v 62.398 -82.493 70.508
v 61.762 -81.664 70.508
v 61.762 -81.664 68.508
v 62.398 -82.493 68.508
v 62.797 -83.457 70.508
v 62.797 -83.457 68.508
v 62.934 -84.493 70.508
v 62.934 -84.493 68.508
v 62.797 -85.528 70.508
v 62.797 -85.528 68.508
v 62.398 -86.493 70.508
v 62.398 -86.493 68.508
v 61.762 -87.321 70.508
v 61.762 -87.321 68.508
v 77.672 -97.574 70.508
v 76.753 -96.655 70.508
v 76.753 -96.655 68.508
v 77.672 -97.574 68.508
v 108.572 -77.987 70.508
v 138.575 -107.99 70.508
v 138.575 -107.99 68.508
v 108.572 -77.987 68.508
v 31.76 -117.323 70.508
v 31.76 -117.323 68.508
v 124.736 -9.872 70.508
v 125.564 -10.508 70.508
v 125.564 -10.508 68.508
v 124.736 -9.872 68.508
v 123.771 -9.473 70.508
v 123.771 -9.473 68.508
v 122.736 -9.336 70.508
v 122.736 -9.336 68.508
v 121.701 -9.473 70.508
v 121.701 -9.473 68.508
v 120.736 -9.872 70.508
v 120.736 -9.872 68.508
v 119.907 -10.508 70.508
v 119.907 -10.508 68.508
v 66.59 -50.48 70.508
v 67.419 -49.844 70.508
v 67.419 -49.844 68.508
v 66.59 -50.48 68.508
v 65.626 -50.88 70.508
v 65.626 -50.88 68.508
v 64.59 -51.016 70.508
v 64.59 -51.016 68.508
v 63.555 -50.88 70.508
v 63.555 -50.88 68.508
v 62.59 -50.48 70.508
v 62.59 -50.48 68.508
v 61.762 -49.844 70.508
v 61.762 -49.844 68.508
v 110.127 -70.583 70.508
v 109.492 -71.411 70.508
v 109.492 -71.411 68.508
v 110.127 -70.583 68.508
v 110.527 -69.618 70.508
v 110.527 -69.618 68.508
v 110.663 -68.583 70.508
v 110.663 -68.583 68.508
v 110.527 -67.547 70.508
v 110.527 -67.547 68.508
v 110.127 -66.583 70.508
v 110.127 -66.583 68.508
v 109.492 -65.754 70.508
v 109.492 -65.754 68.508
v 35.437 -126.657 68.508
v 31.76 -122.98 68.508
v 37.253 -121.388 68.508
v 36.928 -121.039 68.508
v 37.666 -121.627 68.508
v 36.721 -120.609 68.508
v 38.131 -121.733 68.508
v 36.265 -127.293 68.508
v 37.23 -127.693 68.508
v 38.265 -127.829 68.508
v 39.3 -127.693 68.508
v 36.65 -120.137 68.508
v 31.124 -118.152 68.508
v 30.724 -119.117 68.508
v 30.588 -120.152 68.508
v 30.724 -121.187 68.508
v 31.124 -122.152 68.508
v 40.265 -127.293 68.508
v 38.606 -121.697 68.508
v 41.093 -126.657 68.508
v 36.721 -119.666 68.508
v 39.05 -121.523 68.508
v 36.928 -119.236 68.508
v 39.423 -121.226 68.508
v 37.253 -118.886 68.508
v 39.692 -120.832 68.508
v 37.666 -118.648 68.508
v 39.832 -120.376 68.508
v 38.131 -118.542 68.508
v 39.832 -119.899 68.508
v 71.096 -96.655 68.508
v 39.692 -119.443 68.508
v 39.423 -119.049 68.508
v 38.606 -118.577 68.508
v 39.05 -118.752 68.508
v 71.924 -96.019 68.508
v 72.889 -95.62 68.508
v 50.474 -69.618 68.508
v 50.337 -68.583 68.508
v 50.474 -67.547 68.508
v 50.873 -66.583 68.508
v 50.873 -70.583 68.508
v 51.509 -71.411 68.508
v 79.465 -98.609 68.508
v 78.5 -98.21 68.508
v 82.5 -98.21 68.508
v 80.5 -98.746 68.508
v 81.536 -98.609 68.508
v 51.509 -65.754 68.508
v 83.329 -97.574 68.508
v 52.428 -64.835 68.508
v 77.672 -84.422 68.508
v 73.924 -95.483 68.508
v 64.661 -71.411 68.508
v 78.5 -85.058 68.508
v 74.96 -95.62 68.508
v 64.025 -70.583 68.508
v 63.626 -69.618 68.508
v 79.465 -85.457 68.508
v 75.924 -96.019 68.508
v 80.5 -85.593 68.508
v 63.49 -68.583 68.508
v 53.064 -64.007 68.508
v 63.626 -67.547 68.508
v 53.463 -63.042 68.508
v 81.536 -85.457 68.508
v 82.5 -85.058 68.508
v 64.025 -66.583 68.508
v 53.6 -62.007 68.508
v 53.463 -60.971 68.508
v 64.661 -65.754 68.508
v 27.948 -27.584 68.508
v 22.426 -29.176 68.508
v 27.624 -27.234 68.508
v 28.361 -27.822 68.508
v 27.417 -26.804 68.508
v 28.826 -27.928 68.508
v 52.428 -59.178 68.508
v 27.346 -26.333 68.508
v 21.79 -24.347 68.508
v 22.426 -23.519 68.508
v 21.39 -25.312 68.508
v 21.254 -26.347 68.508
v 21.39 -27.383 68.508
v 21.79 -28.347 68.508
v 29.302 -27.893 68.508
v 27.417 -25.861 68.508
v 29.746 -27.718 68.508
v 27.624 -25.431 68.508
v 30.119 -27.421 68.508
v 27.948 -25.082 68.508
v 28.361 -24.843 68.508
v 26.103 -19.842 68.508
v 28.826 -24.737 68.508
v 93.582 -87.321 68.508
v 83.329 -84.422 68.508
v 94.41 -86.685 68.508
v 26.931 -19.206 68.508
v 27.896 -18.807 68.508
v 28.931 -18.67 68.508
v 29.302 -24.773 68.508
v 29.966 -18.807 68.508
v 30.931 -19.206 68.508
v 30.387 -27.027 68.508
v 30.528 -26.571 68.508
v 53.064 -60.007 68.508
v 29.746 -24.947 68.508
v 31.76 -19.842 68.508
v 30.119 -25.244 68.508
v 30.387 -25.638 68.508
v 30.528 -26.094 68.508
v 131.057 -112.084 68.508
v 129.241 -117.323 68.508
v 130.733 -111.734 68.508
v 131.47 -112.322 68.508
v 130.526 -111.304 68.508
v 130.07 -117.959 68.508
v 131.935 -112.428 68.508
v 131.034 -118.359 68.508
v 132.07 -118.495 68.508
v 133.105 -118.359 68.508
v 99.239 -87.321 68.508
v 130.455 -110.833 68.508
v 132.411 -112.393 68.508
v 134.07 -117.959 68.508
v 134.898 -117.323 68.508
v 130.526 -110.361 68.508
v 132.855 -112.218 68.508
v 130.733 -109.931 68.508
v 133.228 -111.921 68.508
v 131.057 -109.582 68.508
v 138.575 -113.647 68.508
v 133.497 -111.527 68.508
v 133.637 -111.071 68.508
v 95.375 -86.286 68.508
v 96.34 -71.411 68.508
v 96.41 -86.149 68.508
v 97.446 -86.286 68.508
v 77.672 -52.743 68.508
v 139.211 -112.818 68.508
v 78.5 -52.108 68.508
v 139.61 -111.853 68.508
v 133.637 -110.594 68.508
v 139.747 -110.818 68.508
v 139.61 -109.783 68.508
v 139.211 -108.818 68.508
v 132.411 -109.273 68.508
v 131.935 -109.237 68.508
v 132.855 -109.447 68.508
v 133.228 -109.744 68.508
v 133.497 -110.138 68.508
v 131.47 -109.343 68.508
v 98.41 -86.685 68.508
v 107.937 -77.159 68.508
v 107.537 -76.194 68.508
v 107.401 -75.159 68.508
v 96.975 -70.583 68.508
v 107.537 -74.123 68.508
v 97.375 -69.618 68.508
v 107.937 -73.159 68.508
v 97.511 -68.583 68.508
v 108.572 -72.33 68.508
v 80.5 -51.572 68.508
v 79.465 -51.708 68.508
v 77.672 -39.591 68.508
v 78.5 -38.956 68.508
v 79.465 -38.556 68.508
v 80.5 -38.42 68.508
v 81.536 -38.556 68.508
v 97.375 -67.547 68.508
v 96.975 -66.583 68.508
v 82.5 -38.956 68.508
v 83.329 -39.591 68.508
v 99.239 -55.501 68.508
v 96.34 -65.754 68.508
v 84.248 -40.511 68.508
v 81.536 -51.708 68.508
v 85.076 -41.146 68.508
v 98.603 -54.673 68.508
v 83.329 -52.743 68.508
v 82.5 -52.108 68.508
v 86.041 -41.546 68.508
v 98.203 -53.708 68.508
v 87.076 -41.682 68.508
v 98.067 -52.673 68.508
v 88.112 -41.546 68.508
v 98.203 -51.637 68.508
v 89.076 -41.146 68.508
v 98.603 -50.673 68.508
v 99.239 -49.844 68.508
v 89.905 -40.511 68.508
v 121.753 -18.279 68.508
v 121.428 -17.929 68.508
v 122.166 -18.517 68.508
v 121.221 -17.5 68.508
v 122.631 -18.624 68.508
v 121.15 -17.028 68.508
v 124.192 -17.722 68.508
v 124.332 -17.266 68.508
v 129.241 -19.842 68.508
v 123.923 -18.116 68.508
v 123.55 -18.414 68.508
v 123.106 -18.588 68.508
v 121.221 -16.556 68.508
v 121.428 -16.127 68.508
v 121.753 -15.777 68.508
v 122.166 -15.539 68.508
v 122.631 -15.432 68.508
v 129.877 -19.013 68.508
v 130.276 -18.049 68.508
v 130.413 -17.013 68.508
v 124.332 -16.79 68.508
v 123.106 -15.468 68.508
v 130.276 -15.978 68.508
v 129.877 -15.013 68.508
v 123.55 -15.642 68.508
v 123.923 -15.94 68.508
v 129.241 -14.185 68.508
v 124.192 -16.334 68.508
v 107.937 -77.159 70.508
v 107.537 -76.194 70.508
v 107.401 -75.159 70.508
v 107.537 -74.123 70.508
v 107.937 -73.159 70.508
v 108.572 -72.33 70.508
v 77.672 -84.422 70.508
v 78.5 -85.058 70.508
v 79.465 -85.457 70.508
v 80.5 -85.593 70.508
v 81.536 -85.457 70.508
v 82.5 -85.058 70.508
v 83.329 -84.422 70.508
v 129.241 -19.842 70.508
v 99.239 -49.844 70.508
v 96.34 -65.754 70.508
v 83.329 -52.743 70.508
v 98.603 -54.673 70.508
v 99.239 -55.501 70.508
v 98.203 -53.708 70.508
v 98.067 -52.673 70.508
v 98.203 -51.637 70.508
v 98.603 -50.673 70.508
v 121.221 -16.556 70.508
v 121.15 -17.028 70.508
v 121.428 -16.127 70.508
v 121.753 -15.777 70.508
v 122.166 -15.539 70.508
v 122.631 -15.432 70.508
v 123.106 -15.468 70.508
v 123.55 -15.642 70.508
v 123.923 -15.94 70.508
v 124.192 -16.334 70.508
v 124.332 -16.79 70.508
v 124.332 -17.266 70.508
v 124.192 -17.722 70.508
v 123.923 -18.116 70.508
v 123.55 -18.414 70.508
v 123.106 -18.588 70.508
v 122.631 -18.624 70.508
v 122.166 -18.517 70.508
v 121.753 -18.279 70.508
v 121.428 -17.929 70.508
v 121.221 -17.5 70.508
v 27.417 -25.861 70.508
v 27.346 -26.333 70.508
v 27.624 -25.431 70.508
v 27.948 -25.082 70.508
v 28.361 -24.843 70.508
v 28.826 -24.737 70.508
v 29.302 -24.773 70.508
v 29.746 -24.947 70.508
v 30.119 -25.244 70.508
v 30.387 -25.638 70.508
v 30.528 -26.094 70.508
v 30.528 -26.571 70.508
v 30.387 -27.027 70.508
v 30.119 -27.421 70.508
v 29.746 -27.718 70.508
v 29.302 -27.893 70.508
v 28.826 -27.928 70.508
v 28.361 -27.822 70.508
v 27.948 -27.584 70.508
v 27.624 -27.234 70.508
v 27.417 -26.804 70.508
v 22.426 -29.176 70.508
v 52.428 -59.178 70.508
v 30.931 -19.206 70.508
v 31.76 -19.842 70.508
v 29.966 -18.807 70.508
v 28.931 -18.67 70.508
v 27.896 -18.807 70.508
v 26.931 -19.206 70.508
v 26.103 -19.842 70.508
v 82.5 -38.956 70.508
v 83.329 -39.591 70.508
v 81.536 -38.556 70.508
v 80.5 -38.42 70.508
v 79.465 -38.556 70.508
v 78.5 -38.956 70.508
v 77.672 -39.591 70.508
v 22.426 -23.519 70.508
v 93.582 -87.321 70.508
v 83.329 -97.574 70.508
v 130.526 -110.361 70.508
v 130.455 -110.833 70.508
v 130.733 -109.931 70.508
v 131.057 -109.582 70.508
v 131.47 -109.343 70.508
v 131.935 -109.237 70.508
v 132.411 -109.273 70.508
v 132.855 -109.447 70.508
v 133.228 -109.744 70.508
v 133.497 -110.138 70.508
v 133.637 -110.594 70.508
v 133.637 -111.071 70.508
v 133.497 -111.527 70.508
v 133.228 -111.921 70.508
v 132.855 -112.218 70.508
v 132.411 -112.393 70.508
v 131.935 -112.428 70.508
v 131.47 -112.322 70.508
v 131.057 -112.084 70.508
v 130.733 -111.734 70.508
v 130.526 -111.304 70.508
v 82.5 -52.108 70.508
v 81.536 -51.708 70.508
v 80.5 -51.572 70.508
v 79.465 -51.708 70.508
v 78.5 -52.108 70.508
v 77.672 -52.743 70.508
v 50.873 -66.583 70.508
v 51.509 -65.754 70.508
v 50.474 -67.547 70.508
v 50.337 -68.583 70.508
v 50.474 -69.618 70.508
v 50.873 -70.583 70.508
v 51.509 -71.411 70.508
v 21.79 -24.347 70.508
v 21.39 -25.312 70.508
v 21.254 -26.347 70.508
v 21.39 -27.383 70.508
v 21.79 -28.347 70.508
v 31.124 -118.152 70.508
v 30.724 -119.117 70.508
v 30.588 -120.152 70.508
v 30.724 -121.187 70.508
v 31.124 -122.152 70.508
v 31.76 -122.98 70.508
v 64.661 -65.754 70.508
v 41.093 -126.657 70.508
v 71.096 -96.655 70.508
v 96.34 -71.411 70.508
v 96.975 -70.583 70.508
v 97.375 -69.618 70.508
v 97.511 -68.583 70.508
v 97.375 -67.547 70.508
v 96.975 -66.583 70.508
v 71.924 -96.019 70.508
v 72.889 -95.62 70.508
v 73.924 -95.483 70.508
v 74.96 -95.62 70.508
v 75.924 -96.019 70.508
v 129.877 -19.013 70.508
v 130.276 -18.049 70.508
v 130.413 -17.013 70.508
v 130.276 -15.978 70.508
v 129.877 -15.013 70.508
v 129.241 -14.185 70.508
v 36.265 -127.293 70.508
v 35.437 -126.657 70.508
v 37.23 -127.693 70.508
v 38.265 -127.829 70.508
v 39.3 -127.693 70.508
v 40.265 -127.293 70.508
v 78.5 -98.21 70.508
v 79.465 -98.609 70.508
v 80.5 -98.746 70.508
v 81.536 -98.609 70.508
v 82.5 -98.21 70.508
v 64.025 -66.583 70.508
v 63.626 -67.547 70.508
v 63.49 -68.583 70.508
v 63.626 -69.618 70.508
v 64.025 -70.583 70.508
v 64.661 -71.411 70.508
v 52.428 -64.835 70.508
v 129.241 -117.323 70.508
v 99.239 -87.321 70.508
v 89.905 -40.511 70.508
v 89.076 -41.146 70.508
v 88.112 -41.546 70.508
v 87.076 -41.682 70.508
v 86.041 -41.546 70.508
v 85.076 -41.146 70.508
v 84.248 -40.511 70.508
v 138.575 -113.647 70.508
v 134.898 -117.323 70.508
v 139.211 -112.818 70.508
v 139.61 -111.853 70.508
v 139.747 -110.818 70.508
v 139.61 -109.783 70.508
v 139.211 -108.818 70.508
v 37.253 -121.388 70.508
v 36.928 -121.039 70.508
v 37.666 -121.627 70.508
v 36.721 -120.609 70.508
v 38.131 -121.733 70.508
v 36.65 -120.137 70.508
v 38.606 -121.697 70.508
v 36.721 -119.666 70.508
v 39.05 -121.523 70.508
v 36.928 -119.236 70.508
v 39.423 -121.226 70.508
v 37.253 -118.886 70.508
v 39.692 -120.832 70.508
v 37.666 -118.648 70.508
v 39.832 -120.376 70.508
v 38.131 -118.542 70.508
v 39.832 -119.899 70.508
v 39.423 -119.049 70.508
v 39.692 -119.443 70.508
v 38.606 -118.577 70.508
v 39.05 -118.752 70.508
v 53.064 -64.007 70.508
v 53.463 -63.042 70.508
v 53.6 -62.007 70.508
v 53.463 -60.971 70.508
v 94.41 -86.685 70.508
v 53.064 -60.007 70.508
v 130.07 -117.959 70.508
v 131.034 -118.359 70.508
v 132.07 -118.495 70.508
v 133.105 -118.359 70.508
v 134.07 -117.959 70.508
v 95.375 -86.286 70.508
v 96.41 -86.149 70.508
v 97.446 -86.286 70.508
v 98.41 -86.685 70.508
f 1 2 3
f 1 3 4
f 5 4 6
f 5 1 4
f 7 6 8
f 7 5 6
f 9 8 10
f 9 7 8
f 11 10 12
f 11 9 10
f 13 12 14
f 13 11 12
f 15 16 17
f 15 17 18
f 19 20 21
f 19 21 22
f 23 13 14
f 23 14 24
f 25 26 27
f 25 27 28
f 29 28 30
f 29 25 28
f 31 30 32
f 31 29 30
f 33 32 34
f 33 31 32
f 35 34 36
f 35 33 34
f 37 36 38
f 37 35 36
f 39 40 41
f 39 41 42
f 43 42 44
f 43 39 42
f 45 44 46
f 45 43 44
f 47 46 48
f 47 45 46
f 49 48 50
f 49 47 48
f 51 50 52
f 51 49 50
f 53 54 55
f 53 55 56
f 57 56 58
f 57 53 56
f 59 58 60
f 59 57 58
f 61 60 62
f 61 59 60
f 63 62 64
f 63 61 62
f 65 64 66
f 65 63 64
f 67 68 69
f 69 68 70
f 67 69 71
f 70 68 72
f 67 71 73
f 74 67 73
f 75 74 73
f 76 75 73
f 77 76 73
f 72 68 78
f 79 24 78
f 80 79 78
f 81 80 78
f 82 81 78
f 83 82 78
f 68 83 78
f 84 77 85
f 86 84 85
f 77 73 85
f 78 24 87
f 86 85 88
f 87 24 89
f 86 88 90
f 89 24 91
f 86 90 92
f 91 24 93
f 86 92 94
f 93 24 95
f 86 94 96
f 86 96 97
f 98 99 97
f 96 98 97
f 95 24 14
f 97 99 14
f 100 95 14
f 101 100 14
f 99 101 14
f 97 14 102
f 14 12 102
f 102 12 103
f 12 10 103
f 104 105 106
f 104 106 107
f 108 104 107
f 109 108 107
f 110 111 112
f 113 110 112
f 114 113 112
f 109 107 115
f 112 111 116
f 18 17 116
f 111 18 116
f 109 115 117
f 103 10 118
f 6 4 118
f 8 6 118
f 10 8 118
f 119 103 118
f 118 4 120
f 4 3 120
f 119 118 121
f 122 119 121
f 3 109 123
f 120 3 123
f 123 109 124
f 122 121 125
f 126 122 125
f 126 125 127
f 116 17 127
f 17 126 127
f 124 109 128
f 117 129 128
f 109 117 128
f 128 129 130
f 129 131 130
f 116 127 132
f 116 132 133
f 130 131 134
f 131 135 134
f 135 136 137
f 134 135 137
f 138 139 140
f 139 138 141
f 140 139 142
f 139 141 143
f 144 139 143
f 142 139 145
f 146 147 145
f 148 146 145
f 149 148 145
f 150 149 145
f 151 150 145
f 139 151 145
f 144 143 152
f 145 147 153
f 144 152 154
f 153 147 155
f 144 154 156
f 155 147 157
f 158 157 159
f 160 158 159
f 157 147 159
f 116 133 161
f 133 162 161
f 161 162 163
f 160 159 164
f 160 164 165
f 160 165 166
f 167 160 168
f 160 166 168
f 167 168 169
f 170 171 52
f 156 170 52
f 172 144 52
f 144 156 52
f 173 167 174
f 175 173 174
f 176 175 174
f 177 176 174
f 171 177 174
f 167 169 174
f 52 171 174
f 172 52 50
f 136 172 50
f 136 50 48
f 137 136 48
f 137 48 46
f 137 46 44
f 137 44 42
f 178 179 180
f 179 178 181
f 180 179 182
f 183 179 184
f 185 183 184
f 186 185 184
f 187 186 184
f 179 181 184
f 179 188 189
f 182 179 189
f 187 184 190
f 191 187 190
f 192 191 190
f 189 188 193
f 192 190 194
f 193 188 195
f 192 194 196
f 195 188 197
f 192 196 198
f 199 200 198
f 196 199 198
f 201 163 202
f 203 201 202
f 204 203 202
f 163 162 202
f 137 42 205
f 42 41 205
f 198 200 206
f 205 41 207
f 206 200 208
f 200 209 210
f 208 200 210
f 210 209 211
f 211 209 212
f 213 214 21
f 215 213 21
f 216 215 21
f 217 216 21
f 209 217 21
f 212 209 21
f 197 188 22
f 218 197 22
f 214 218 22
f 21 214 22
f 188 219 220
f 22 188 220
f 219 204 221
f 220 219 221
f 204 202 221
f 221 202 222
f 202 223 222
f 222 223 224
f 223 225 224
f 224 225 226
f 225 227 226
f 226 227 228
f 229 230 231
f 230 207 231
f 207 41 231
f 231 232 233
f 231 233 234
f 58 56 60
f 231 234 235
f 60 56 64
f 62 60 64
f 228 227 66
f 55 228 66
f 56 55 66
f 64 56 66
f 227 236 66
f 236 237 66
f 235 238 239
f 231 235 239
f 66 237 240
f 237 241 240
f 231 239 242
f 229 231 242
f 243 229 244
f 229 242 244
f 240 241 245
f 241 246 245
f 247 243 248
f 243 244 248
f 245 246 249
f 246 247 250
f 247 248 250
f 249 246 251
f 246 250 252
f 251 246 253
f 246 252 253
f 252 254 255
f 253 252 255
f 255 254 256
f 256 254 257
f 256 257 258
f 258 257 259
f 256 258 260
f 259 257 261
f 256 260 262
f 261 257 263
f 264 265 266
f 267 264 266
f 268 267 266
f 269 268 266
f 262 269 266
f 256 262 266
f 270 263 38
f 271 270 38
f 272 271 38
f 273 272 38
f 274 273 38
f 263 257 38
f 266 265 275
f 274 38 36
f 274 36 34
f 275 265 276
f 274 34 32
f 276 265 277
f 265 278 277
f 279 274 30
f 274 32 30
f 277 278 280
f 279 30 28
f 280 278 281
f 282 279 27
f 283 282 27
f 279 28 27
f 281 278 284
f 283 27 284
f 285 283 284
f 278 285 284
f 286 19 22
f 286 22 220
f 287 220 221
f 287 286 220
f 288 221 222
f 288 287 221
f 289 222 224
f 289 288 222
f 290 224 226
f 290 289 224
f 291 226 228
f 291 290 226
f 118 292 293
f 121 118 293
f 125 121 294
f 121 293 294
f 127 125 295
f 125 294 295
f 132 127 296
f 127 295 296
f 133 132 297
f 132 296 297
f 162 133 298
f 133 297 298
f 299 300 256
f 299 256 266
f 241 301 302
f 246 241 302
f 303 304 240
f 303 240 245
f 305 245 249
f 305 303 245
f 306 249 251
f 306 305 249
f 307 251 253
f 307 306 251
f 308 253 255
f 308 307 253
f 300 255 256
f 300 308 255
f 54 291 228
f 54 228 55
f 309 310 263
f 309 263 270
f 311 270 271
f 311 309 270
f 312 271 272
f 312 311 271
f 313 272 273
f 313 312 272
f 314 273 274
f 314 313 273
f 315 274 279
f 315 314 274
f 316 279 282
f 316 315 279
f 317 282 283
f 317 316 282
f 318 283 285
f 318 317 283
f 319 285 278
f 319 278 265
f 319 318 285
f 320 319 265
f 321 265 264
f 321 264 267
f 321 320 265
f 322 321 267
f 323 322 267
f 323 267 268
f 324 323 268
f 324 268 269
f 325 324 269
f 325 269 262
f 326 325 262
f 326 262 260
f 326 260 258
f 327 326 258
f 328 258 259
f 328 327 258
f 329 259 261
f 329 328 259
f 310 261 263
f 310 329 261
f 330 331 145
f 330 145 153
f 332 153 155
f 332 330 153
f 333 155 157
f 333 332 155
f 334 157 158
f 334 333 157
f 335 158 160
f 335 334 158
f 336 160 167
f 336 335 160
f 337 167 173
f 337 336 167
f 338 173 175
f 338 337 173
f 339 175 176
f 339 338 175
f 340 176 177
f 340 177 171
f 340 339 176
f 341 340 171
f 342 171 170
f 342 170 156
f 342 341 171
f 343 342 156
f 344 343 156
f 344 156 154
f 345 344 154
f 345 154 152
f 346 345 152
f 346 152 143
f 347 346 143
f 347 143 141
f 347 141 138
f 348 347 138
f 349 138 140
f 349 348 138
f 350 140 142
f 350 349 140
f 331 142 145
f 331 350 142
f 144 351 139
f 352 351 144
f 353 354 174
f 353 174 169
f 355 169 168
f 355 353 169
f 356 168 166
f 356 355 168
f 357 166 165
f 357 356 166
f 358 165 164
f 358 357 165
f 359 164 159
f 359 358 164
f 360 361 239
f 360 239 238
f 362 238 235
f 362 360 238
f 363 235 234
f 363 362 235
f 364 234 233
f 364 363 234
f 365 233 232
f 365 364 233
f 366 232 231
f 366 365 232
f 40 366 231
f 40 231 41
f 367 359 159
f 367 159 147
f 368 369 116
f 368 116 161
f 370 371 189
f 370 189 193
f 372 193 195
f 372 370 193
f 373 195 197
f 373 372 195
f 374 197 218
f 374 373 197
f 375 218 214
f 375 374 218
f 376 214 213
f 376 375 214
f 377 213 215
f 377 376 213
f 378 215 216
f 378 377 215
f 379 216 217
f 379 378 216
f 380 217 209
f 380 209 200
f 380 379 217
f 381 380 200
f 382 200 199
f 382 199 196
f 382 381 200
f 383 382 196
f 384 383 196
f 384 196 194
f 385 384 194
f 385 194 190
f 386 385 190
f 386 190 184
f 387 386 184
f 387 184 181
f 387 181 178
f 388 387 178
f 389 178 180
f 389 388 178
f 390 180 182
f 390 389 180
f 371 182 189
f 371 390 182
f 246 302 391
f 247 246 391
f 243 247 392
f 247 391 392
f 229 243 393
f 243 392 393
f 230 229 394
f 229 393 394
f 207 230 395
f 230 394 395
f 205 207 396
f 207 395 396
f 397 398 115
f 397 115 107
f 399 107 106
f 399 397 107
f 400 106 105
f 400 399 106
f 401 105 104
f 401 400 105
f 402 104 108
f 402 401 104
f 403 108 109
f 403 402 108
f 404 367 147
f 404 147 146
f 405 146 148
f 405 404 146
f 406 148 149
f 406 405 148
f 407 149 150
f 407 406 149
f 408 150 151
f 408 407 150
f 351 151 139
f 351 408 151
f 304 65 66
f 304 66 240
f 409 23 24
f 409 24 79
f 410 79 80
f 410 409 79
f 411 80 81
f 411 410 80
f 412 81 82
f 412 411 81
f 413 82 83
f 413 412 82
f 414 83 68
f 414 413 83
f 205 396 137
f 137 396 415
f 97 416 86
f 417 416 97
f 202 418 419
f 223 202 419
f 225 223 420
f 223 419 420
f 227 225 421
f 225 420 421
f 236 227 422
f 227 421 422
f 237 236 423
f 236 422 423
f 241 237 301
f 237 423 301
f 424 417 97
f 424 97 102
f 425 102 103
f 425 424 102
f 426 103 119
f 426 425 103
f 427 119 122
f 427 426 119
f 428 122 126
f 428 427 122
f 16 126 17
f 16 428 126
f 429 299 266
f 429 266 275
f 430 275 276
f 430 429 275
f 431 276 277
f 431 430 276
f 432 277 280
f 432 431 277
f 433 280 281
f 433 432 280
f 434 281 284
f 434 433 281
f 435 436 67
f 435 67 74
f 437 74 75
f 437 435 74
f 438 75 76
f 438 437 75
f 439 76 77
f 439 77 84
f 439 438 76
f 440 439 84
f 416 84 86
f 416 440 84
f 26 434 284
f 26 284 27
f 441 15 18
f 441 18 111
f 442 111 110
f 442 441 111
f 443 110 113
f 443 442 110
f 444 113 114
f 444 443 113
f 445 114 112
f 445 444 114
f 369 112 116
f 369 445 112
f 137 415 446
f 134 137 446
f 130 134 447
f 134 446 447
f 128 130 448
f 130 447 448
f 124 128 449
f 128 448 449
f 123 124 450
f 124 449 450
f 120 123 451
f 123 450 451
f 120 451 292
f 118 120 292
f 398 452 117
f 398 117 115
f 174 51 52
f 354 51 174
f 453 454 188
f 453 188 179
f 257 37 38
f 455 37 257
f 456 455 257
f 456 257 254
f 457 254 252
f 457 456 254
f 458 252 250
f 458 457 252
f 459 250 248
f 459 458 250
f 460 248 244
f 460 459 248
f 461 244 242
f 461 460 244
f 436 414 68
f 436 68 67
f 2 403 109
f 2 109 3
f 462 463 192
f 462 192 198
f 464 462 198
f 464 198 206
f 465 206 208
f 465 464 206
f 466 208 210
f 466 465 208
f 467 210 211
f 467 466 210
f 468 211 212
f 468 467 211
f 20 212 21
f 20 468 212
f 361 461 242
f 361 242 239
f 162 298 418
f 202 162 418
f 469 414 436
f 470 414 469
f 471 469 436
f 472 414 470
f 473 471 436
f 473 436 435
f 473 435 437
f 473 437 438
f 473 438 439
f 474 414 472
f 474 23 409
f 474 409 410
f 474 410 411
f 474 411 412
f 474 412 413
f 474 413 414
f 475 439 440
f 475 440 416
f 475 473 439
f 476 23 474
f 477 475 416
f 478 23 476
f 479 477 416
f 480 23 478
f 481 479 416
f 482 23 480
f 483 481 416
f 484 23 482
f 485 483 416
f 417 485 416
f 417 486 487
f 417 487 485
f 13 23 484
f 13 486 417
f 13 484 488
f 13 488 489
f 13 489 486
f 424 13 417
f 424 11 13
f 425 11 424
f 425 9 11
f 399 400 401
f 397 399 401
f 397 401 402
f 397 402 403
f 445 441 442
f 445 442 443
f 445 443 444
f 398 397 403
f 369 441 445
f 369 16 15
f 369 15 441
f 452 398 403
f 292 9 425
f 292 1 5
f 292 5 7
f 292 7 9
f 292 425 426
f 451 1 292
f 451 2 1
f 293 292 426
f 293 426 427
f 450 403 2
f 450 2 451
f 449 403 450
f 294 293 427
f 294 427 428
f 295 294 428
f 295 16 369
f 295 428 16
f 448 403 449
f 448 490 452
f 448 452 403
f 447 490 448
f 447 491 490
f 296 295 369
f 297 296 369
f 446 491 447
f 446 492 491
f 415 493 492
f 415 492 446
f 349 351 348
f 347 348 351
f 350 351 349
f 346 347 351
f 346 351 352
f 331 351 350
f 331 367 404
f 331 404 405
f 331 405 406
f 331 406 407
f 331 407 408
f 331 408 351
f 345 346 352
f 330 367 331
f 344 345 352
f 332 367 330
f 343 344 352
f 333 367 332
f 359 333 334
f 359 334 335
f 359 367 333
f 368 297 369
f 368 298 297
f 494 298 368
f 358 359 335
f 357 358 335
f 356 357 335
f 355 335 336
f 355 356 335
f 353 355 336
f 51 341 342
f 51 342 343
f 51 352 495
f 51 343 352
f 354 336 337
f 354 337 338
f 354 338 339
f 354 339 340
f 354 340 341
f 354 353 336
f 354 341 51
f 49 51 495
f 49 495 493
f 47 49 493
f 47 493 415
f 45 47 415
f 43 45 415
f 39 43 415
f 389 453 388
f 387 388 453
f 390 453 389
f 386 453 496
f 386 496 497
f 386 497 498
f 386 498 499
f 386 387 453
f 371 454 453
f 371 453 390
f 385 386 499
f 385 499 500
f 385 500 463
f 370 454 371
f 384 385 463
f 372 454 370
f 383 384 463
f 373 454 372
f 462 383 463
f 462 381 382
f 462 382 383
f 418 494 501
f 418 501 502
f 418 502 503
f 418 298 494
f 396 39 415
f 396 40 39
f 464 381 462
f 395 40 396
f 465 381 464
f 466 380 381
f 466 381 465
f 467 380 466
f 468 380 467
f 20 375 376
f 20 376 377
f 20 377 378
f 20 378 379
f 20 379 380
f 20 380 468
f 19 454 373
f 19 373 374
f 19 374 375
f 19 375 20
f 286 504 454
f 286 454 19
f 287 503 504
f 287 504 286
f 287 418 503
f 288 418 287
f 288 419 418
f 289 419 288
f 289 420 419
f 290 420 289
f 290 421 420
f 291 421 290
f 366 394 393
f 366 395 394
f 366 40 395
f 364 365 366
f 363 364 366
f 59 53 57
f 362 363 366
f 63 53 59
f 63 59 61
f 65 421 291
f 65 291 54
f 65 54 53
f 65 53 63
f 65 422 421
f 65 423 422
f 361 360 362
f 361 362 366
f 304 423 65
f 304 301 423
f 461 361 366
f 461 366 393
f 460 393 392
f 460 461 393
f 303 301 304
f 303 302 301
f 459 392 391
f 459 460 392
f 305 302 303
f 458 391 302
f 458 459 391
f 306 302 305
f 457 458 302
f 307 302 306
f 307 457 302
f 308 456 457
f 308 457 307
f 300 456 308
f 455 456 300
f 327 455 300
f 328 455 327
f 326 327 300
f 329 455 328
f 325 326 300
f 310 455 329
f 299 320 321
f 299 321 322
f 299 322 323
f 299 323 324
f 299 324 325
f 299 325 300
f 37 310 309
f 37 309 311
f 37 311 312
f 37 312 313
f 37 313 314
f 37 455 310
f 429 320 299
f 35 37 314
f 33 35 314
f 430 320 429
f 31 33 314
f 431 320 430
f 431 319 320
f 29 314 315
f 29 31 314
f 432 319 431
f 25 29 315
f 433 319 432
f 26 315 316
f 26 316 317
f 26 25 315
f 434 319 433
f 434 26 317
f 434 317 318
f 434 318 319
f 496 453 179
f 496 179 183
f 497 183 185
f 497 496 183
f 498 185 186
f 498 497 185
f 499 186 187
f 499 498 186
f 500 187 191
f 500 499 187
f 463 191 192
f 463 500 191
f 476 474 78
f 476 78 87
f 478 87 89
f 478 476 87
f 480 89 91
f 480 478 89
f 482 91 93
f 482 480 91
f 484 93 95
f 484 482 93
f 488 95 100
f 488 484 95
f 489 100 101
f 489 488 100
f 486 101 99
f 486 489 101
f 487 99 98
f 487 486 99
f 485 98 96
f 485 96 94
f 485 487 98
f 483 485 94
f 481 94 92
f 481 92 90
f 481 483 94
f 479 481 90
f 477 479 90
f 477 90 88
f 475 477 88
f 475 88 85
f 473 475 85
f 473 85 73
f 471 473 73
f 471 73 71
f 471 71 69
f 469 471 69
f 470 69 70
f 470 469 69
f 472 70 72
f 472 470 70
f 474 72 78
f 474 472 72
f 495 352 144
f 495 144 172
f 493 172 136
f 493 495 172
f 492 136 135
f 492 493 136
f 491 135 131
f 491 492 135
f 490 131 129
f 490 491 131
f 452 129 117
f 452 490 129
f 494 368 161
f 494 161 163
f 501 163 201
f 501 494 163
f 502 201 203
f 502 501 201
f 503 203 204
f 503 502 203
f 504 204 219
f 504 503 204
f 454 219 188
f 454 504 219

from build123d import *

# Parameters (mm, degrees)
SKETCH2_R           = 1.6
BOSS_EXTRUDE1_DEPTH = 2


with BuildPart() as part:
    # Sketch2 → Boss-Extrude1 (new body)
    with BuildSketch(Plane(origin=(0, 0, 70.507785861), x_dir=(-1, 0, 0), z_dir=(0, 0, -1))):
        with BuildLine():
            Line((-109.491735006, -65.754238005), (-99.238686679, -55.501189677))
            ThreePointArc((-99.238686679, -55.501189677), (-98.067113804, -52.672762553), (-99.238686679, -49.844335428))
            Line((-99.238686679, -49.844335428), (-129.24116868, -19.841853427))
            ThreePointArc((-129.24116868, -19.841853427), (-130.412741556, -17.013426302), (-129.24116868, -14.184999177))
            Line((-129.24116868, -14.184999177), (-125.564213418, -10.508043915))
            ThreePointArc((-125.564213418, -10.508043915), (-122.735786293, -9.33647104), (-119.907359169, -10.508043915))
            Line((-119.907359169, -10.508043915), (-89.904877167, -40.510525916))
            ThreePointArc((-89.904877167, -40.510525916), (-87.076450042, -41.682098792), (-84.248022918, -40.510525916))
            Line((-84.248022918, -40.510525916), (-83.328784102, -39.591287101))
            ThreePointArc((-83.328784102, -39.591287101), (-80.500356977, -38.419714226), (-77.671929853, -39.591287101))
            Line((-77.671929853, -39.591287101), (-67.418881525, -49.844335428))
            ThreePointArc((-67.418881525, -49.844335428), (-64.590454401, -51.015908303), (-61.762027276, -49.844335428))
            Line((-61.762027276, -49.844335428), (-31.759545275, -19.841853427))
            ThreePointArc((-31.759545275, -19.841853427), (-28.93111815, -18.670280551), (-26.102691025, -19.841853427))
            Line((-26.102691025, -19.841853427), (-22.425735763, -23.518808689))
            ThreePointArc((-22.425735763, -23.518808689), (-21.254162888, -26.347235813), (-22.425735763, -29.175662938))
            Line((-22.425735763, -29.175662938), (-52.428217764, -59.17814494))
            ThreePointArc((-52.428217764, -59.17814494), (-53.59979064, -62.006572064), (-52.428217764, -64.834999189))
            Line((-52.428217764, -64.834999189), (-51.508978949, -65.754238005))
            ThreePointArc((-51.508978949, -65.754238005), (-50.337406074, -68.582665129), (-51.508978949, -71.411092254))
            Line((-51.508978949, -71.411092254), (-61.762027276, -81.664140581))
            ThreePointArc((-61.762027276, -81.664140581), (-62.933600151, -84.492567706), (-61.762027276, -87.320994831))
            Line((-61.762027276, -87.320994831), (-31.759545275, -117.323476832))
            ThreePointArc((-31.759545275, -117.323476832), (-30.587972399, -120.151903957), (-31.759545275, -122.980331082))
            Line((-31.759545275, -122.980331082), (-35.436500537, -126.657286344))
            ThreePointArc((-35.436500537, -126.657286344), (-38.264927661, -127.828859219), (-41.093354786, -126.657286344))
            Line((-41.093354786, -126.657286344), (-71.095836788, -96.654804343))
            ThreePointArc((-71.095836788, -96.654804343), (-73.924263912, -95.483231467), (-76.752691037, -96.654804343))
            Line((-76.752691037, -96.654804343), (-77.671929853, -97.574043158))
            ThreePointArc((-77.671929853, -97.574043158), (-80.500356977, -98.745616033), (-83.328784102, -97.574043158))
            Line((-83.328784102, -97.574043158), (-93.581832429, -87.320994831))
            ThreePointArc((-93.581832429, -87.320994831), (-96.410259554, -86.149421956), (-99.238686679, -87.320994831))
            Line((-99.238686679, -87.320994831), (-129.24116868, -117.323476832))
            ThreePointArc((-129.24116868, -117.323476832), (-132.069595805, -118.495049708), (-134.89802293, -117.323476832))
            Line((-134.89802293, -117.323476832), (-138.574978192, -113.64652157))
            ThreePointArc((-138.574978192, -113.64652157), (-139.746551067, -110.818094445), (-138.574978192, -107.989667321))
            Line((-138.574978192, -107.989667321), (-108.572496191, -77.987185319))
            ThreePointArc((-108.572496191, -77.987185319), (-107.400923315, -75.158758194), (-108.572496191, -72.33033107))
            Line((-108.572496191, -72.33033107), (-109.491735006, -71.411092254))
            ThreePointArc((-109.491735006, -71.411092254), (-110.663307881, -68.582665129), (-109.491735006, -65.754238005))
        make_face()
        with Locations((-132.055025121, -110.832665129)):
            Circle(SKETCH2_R, mode=Mode.SUBTRACT)
        with Locations((-28.945688834, -26.332665129)):
            Circle(SKETCH2_R, mode=Mode.SUBTRACT)
        with Locations((-122.750356977, -17.027996986)):
            Circle(SKETCH2_R, mode=Mode.SUBTRACT)
        with Locations((-38.250356977, -120.137333273)):
            Circle(SKETCH2_R, mode=Mode.SUBTRACT)
        with BuildLine():
            Line((-96.339548876, -65.754238005), (-83.328784102, -52.743473231))
            ThreePointArc((-83.328784102, -52.743473231), (-80.500356977, -51.571900356), (-77.671929853, -52.743473231))
            Line((-77.671929853, -52.743473231), (-64.661165079, -65.754238005))
            ThreePointArc((-64.661165079, -65.754238005), (-63.489592204, -68.582665129), (-64.661165079, -71.411092254))
            Line((-64.661165079, -71.411092254), (-77.671929853, -84.421857028))
            ThreePointArc((-77.671929853, -84.421857028), (-80.500356977, -85.593429903), (-83.328784102, -84.421857028))
            Line((-83.328784102, -84.421857028), (-96.339548876, -71.411092254))
            ThreePointArc((-96.339548876, -71.411092254), (-97.511121751, -68.582665129), (-96.339548876, -65.754238005))
        make_face(mode=Mode.SUBTRACT)
    extrude(amount=BOSS_EXTRUDE1_DEPTH)


solid = part.part
